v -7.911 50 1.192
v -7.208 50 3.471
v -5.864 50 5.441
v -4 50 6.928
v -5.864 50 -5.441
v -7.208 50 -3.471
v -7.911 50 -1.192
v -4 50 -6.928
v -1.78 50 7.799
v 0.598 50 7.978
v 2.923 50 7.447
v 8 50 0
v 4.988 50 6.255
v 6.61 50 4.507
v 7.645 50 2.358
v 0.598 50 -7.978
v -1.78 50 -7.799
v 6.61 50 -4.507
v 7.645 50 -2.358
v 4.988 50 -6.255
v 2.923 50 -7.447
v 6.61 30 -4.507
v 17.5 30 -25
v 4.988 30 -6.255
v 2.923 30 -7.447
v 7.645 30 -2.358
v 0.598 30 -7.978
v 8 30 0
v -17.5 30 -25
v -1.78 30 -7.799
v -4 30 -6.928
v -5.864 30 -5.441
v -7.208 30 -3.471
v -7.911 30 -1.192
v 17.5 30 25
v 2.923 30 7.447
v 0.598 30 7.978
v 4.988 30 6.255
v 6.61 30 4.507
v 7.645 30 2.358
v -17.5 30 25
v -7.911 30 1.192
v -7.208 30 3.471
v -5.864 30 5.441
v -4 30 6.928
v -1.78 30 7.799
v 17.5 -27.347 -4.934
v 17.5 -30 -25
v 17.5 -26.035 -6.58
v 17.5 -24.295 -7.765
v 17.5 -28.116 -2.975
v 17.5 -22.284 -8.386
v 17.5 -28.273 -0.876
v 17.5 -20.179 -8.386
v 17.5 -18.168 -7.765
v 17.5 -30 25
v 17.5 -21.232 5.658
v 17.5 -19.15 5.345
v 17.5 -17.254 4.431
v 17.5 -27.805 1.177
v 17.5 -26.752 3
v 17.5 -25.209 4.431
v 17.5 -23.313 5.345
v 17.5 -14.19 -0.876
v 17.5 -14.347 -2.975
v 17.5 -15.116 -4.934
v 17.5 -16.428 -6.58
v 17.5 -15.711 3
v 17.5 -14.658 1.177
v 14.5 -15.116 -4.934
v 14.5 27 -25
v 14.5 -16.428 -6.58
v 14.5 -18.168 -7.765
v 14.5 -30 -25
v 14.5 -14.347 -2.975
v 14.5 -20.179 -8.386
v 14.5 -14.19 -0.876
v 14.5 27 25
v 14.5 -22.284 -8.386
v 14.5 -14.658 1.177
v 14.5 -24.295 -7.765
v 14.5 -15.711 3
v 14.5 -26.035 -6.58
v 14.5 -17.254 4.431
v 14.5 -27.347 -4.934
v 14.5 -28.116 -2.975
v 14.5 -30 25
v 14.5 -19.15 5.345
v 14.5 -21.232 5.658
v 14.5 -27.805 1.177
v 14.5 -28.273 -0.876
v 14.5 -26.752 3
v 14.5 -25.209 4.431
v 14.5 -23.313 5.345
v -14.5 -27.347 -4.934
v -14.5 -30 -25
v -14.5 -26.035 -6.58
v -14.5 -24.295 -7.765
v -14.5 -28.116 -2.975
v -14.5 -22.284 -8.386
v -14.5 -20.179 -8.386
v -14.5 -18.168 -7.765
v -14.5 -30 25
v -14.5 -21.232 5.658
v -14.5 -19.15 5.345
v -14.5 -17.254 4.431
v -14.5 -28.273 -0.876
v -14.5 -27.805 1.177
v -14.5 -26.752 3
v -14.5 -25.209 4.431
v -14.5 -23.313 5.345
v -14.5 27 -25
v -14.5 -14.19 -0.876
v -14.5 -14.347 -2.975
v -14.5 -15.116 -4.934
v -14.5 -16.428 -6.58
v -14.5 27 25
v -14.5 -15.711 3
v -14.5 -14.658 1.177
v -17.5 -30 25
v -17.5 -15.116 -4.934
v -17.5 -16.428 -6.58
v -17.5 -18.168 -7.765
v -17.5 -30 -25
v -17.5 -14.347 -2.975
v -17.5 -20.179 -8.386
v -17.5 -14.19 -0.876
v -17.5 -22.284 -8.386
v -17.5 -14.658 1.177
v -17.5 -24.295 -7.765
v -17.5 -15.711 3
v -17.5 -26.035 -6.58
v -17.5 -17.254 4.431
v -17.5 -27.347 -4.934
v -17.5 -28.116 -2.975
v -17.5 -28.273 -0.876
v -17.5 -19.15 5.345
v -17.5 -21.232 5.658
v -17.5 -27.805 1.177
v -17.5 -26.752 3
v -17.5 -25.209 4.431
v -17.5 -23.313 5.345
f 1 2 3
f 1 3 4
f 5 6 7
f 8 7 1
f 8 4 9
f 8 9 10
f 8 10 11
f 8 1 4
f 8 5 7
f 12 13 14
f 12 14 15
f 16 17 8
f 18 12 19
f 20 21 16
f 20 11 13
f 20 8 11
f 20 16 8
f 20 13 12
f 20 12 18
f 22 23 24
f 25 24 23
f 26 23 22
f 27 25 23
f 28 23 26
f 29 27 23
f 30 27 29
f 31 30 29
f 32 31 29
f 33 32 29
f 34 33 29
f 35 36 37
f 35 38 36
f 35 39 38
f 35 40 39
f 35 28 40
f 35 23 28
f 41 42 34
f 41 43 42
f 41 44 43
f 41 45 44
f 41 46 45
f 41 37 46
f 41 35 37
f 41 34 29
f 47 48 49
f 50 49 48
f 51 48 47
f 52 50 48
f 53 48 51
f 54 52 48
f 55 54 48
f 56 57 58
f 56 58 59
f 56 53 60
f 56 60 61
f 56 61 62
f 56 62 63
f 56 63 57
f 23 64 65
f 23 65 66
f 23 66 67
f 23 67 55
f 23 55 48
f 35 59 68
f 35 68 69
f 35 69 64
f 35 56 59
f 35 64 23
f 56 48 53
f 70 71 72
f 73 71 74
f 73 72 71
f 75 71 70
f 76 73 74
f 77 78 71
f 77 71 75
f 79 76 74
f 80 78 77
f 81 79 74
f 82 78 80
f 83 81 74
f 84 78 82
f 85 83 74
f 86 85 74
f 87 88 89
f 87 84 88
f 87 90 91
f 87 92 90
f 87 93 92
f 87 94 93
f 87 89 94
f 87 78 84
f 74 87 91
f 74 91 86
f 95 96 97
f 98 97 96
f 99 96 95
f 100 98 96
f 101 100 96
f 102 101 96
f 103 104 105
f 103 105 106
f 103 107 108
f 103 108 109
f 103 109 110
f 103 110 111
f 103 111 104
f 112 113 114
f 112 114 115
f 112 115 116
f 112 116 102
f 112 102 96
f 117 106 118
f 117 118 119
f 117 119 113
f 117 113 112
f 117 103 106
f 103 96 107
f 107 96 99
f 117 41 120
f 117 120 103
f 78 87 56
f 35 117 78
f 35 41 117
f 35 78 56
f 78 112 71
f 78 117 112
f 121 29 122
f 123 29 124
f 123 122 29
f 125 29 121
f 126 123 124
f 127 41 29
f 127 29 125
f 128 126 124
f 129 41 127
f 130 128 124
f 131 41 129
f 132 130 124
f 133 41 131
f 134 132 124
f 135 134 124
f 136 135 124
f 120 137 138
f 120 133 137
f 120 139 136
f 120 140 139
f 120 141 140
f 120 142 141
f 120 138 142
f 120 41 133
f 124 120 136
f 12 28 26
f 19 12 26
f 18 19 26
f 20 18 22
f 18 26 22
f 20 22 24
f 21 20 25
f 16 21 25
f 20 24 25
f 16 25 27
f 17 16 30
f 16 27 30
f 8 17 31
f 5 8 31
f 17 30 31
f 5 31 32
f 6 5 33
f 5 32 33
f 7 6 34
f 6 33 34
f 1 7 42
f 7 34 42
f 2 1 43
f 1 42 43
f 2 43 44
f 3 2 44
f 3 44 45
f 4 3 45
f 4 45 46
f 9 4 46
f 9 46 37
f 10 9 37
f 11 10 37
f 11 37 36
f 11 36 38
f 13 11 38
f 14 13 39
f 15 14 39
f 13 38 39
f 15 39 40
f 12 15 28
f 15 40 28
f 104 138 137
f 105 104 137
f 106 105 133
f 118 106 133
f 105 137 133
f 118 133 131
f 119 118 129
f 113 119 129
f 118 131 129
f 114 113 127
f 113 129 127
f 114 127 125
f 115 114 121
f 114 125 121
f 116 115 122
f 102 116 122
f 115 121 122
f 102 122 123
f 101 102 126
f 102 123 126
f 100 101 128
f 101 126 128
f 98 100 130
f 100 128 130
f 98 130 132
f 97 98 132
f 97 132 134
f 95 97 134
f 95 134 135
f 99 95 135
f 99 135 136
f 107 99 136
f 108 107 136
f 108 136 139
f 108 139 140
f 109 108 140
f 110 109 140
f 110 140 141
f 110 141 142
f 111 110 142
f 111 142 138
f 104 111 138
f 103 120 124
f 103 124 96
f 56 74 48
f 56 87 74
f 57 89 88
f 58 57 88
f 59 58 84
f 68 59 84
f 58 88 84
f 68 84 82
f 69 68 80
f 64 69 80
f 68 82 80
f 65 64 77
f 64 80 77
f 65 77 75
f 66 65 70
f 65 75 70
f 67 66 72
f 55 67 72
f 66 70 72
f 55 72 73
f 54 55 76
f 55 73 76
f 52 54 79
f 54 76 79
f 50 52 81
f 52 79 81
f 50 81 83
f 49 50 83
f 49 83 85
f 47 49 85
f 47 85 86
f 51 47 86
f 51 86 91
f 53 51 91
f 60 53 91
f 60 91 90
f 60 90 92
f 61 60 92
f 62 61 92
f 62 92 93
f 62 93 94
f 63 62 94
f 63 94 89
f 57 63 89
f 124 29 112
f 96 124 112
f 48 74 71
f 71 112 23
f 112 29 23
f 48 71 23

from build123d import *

# Parameters (mm, degrees)
BOSS_EXTRUDE2_DEPTH = 25
SKETCH4_R           = 8
BOSS_EXTRUDE3_DEPTH = 20
SKETCH5_R           = 7.061522099
CUT_EXTRUDE2_DEPTH  = 36


with BuildPart() as part:
    # Sketch3 → Boss-Extrude2 (new body, symmetric)
    with BuildSketch(Plane.XY):
        Polygon((14.5, -30), (17.5, -30), (17.5, 30), (-17.5, 30), (-17.5, -30), (-14.5, -30), (-14.5, 27), (14.5, 27), align=None)
    extrude(amount=BOSS_EXTRUDE2_DEPTH, both=True)

    # Sketch4 → Boss-Extrude3 (add)
    with BuildSketch(Plane(origin=(0, 30, 0), x_dir=(1, 0, 0), z_dir=(0, 1, 0))):
        Circle(SKETCH4_R)
    extrude(amount=BOSS_EXTRUDE3_DEPTH)

    # Sketch5 → Cut-Extrude2 (cut, through all)
    with BuildSketch(Plane.ZY.offset(17.5)):
        with Locations((-1.403257922, -21.231511185)):
            Circle(SKETCH5_R)
    extrude(amount=-CUT_EXTRUDE2_DEPTH, mode=Mode.SUBTRACT)


solid = part.part
